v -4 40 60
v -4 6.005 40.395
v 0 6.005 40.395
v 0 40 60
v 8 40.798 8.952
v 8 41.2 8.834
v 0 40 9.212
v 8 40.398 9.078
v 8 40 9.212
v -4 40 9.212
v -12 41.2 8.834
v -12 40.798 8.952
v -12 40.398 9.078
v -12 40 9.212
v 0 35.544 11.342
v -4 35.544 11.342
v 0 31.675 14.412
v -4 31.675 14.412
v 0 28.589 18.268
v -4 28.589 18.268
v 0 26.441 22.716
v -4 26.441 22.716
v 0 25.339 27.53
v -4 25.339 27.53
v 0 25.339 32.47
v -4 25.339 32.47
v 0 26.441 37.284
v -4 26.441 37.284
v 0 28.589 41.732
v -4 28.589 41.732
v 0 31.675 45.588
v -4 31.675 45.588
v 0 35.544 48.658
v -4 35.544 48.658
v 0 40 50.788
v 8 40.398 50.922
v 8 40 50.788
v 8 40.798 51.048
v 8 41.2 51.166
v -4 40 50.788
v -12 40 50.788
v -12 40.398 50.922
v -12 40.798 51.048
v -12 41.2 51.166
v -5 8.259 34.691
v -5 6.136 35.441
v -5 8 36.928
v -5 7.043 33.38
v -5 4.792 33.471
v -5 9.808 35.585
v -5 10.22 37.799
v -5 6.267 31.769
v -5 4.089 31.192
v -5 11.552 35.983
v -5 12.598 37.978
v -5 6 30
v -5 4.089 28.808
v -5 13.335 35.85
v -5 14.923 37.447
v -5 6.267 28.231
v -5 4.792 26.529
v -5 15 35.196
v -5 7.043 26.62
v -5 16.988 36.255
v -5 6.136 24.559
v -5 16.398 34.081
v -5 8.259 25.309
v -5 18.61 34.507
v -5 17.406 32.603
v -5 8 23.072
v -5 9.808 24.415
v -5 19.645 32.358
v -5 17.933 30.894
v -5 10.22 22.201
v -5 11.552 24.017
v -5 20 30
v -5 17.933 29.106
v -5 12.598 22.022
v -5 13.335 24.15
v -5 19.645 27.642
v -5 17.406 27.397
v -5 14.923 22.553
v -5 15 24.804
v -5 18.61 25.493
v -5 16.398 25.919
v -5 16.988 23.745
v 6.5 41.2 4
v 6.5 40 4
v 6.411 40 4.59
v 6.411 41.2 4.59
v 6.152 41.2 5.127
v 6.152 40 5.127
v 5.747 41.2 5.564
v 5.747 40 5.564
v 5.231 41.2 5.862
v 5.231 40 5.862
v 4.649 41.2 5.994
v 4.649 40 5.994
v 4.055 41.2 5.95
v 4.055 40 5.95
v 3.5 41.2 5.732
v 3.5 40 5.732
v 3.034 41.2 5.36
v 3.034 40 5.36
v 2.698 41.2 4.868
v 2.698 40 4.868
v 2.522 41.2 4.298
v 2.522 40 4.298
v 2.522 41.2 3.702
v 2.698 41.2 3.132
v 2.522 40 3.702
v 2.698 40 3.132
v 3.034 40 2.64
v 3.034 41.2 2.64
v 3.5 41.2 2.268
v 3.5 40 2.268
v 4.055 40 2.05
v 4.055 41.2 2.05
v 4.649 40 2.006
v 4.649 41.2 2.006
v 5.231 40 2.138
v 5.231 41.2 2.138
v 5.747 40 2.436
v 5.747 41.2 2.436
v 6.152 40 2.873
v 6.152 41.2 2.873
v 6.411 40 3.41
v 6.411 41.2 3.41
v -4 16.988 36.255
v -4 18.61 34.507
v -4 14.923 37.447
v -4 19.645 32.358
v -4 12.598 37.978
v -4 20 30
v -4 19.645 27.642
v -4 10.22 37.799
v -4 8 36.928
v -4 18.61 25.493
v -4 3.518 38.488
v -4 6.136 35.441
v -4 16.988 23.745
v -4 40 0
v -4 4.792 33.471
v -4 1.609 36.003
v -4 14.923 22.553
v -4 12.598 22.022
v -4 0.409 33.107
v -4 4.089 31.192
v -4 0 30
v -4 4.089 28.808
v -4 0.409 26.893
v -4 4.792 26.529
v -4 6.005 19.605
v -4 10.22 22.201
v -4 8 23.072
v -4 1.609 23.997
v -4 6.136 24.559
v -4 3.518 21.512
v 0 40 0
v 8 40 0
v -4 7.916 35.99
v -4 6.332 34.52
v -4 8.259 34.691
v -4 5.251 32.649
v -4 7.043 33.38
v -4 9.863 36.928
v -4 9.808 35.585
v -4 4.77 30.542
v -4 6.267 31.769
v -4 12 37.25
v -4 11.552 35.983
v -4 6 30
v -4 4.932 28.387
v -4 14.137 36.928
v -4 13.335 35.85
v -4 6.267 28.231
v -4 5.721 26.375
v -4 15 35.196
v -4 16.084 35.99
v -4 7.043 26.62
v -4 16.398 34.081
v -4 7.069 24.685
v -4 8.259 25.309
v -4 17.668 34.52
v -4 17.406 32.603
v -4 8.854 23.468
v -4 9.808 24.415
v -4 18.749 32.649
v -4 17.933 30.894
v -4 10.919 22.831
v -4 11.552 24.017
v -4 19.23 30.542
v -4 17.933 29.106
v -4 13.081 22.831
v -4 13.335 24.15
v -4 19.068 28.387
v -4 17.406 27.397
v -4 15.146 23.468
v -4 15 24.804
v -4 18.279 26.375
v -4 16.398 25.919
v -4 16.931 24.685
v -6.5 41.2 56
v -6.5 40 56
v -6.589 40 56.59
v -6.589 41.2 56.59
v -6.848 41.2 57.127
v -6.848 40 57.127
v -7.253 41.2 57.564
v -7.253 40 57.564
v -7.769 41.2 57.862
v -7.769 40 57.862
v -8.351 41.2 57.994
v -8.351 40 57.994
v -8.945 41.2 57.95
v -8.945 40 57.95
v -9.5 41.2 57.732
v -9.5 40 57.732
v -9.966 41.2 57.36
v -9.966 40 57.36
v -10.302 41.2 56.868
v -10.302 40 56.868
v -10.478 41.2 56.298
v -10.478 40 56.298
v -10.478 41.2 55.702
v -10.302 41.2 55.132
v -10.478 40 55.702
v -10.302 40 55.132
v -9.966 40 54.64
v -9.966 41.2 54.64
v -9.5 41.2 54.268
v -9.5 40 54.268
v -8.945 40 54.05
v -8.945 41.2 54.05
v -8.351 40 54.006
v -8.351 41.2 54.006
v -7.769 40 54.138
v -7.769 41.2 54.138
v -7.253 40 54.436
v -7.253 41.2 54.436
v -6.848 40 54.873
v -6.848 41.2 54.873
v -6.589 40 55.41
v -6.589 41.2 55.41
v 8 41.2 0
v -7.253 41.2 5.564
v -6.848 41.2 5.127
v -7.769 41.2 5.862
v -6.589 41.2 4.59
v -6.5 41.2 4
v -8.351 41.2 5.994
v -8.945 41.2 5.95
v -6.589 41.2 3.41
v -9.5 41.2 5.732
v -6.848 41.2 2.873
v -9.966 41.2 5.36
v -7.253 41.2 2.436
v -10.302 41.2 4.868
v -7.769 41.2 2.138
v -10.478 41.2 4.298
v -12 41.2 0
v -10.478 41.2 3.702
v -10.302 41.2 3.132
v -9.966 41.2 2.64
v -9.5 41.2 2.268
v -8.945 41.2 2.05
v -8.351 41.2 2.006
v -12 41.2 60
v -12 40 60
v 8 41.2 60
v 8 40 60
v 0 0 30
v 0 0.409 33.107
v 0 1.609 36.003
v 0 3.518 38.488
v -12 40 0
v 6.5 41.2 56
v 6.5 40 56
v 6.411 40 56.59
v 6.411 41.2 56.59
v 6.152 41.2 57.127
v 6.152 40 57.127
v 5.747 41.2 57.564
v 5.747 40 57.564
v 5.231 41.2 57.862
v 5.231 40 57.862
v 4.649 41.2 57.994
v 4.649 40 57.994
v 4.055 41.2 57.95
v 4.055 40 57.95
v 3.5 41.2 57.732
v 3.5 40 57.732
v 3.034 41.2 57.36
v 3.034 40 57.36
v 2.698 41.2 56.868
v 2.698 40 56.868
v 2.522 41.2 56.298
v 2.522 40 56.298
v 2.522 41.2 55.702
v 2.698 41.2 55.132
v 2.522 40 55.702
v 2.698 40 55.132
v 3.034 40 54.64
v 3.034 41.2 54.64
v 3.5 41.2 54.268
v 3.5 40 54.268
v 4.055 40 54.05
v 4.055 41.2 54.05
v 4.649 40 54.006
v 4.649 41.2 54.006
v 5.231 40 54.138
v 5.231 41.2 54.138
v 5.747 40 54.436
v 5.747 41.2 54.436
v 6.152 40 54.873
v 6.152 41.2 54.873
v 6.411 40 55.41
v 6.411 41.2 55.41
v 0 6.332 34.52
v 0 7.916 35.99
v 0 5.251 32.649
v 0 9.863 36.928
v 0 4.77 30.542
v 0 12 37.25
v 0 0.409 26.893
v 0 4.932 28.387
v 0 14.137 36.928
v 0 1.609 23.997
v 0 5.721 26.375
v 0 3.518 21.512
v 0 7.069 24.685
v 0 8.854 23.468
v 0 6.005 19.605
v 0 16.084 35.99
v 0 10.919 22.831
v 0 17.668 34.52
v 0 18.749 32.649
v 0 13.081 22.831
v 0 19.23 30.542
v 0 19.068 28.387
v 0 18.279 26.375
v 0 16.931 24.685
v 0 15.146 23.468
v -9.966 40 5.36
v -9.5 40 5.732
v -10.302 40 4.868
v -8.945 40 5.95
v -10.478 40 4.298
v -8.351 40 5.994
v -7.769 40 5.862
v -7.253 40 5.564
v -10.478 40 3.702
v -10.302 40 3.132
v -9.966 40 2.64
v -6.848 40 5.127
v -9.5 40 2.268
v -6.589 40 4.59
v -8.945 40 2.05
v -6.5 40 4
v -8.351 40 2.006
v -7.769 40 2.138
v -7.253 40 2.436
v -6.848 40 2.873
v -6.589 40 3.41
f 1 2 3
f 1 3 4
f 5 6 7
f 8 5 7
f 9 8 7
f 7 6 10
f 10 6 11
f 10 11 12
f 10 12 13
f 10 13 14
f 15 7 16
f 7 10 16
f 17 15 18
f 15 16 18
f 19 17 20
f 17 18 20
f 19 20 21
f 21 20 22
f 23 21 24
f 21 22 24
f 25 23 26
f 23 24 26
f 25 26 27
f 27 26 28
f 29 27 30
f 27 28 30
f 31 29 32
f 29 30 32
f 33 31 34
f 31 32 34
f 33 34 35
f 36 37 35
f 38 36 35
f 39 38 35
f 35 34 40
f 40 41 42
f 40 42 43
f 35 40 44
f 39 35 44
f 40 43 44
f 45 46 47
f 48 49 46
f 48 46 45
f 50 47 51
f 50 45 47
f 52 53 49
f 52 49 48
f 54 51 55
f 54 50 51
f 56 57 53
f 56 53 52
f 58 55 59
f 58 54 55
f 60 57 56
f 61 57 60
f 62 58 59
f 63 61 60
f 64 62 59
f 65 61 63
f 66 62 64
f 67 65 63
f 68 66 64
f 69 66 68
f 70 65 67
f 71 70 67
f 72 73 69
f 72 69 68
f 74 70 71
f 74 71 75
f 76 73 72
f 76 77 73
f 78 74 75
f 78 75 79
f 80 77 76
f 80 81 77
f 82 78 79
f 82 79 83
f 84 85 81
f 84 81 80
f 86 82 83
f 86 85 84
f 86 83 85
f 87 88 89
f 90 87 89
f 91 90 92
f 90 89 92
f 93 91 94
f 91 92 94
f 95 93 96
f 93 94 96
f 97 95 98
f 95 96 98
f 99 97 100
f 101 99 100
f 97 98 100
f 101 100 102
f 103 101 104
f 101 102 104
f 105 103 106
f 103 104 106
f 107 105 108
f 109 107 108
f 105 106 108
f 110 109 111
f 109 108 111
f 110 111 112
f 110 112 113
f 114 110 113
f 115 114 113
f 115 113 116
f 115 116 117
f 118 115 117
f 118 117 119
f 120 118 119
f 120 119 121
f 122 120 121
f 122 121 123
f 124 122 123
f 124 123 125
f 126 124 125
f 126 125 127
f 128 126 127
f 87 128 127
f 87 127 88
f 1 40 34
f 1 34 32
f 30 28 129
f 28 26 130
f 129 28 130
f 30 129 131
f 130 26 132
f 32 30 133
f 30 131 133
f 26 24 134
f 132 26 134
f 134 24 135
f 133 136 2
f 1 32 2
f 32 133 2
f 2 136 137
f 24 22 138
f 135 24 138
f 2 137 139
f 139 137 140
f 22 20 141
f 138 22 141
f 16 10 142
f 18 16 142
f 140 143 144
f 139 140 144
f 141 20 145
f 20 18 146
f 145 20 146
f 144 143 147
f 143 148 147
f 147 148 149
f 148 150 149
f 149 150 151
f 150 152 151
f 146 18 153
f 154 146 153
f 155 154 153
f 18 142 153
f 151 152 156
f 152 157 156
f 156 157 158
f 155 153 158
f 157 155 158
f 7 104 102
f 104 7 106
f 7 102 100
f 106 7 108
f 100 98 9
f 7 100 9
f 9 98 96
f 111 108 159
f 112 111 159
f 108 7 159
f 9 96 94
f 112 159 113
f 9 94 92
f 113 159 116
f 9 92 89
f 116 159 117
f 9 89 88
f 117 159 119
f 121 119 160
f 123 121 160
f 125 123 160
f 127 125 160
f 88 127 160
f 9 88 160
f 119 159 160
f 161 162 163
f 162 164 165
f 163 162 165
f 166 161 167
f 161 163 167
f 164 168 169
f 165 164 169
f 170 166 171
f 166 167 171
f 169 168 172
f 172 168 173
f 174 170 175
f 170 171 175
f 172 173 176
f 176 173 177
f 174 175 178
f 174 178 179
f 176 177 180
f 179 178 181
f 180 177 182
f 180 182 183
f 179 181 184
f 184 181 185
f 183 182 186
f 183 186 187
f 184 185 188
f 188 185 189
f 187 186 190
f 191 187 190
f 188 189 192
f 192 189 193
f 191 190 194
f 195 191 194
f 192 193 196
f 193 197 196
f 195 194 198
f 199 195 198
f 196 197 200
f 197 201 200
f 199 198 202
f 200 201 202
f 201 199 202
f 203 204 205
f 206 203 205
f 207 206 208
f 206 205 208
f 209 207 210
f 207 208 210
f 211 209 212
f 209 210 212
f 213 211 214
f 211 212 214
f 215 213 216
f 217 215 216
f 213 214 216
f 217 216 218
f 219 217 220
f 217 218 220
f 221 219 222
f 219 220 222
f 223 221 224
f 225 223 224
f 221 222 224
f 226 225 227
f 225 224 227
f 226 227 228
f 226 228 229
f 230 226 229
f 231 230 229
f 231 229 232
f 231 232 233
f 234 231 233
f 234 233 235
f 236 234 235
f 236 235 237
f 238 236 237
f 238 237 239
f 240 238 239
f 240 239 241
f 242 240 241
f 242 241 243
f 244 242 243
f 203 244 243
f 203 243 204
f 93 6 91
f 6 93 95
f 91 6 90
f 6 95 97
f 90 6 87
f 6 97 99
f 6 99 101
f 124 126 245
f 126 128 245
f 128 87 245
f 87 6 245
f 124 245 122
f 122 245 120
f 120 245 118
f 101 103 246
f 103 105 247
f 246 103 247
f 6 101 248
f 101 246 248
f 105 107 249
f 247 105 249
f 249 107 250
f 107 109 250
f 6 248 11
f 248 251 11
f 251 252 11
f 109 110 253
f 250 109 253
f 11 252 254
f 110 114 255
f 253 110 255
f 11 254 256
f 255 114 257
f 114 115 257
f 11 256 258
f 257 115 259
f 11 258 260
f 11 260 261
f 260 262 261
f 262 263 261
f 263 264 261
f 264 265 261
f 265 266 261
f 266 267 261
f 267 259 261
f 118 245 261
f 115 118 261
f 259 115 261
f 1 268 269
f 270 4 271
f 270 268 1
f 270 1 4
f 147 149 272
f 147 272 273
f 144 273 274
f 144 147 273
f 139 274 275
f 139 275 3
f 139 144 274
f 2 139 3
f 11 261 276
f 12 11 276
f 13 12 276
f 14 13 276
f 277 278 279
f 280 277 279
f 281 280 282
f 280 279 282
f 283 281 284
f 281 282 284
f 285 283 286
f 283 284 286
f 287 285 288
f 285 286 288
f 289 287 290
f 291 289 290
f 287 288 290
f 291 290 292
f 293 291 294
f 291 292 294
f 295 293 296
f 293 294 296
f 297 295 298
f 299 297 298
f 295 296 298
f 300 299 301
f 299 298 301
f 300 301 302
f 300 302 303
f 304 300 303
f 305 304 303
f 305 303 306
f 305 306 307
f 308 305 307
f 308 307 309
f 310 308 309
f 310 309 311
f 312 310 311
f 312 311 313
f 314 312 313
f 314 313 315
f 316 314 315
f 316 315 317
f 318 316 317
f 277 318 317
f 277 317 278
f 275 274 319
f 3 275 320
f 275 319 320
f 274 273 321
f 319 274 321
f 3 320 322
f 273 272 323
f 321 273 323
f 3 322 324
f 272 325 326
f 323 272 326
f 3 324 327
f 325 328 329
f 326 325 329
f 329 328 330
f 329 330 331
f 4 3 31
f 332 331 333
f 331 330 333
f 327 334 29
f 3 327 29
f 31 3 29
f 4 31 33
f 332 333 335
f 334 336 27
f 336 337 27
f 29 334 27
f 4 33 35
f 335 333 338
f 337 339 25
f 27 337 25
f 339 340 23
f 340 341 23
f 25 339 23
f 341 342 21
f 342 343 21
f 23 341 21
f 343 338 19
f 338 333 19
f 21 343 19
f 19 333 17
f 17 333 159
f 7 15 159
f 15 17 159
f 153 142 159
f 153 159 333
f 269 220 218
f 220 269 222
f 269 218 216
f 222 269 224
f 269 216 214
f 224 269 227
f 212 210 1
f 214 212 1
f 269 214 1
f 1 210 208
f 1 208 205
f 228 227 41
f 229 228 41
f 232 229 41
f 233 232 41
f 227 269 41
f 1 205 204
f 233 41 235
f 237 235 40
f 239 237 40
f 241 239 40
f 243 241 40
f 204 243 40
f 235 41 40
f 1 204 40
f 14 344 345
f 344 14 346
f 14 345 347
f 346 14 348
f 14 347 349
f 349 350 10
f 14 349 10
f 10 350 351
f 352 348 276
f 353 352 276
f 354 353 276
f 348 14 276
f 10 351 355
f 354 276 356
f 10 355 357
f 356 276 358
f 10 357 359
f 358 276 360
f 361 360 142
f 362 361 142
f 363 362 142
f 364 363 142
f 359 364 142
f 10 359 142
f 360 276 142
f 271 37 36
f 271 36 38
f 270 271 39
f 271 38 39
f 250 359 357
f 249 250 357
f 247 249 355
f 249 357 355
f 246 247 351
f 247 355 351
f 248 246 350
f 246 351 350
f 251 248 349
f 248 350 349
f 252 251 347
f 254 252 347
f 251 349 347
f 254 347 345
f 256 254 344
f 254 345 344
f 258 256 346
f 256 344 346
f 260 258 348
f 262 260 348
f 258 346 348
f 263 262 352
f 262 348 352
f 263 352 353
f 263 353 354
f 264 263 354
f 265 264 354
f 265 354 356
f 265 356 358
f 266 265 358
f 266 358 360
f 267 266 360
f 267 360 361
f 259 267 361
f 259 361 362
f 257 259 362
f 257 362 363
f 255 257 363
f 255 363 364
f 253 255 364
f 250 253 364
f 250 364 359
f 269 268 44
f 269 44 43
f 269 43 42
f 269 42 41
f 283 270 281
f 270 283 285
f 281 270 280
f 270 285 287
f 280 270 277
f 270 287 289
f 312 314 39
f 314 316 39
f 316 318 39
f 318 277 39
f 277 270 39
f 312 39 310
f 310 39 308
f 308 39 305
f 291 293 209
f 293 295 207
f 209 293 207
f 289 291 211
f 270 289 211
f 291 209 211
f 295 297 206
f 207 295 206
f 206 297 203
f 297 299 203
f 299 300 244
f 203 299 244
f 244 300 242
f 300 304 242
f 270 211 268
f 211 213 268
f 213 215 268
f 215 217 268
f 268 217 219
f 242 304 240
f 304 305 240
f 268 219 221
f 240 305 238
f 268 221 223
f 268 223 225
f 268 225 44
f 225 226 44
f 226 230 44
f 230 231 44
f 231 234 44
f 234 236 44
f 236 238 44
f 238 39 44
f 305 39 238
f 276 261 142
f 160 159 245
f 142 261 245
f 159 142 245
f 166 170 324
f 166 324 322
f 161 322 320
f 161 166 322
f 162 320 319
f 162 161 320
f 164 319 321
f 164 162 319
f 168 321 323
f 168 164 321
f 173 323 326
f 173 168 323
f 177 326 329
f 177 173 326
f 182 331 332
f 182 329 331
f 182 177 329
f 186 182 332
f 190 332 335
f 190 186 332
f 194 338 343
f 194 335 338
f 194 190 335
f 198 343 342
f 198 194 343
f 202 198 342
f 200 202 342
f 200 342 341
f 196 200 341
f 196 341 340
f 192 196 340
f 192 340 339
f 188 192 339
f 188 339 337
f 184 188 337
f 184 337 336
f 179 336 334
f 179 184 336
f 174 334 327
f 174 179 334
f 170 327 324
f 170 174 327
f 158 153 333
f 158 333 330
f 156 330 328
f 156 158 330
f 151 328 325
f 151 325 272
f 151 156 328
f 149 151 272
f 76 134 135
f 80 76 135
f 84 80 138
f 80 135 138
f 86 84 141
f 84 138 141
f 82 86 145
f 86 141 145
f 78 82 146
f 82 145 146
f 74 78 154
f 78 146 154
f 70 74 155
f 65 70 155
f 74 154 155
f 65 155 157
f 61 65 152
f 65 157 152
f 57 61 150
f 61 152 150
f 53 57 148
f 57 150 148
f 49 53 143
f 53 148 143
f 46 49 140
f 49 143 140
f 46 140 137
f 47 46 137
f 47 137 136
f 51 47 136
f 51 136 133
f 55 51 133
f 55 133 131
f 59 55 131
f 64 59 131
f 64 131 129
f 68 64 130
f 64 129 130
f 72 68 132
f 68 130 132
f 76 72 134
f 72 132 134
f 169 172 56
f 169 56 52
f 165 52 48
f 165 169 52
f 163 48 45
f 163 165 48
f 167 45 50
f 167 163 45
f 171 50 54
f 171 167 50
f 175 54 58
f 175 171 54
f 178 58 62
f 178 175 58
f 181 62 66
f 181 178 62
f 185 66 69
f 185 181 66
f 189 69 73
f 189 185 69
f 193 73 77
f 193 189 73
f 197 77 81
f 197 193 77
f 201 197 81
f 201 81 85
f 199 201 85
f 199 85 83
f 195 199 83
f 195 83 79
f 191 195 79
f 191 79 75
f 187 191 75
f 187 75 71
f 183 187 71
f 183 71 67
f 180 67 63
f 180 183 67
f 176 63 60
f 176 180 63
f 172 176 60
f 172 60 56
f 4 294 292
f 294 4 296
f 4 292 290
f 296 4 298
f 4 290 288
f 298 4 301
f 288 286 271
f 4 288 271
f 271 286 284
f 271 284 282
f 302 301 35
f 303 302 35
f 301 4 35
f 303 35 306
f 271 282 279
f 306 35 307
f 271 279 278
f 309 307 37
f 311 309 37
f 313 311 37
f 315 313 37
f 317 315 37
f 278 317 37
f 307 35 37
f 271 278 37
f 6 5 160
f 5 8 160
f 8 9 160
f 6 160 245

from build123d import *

# Parameters (mm, degrees)
EXTRUDE_1_DEPTH          = 60
CUT_EXTRUDE_1_DEPTH      = 40
CUT_EXTRUDE_1_DEPTH_BACK = 40
SKETCH_2_R               = 7.25
SKETCH_3_R               = 8
SKETCH_3_R_2             = 6
EXTRUDE_2_DEPTH          = 1
CUT_EXTRUDE_2_REACH      = 75.103
SKETCH_4_R               = 2


with BuildPart() as part:
    # 草图1 → 凸台-拉伸1 (new body)
    with BuildSketch(Plane.XY):
        Polygon((0, 0), (0, 40), (8, 40), (8, 41.2), (-12, 41.2), (-12, 40), (-4, 40), (-4, 0), align=None)
    extrude(amount=EXTRUDE_1_DEPTH)

    # 草图2 → 切除-拉伸1 (cut, two sides: drawn at the far end of the back side and taken through both)
    with BuildSketch(Plane(origin=(0, 0, 0), x_dir=(0, 0, -1), z_dir=(1, 0, 0)).offset(-CUT_EXTRUDE_1_DEPTH_BACK)):
        with BuildLine():
            ThreePointArc((-19.604755263, 6.005094925), (-23.997453078, 1.609166037), (-30, 0))
            Line((-30, 0), (0, 0))
            Line((0, 0), (0, 40))
            Line((0, 40), (-19.604755263, 6.005094925))
        make_face()
        with BuildLine():
            Line((-40.395244737, 6.005094925), (-60, 40))
            Line((-60, 40), (-60, 0))
            Line((-60, 0), (-30, 0))
            ThreePointArc((-30, 0), (-36.002546922, 1.609166037), (-40.395244737, 6.005094925))
        make_face()
        with Locations(Location((-30, 12, 0), (0, 0, 180))):
            Circle(SKETCH_2_R)
        with BuildLine():
            Line((-51.166010489, 41.2), (-8.833989511, 41.2))
            ThreePointArc((-8.833989511, 41.2), (-30, 25.2), (-51.166010489, 41.2))
        make_face()
    extrude(amount=CUT_EXTRUDE_1_DEPTH + CUT_EXTRUDE_1_DEPTH_BACK, mode=Mode.SUBTRACT)

    # 草图3 → 凸台-拉伸2 (add)
    with BuildSketch(Plane.ZY.offset(4)):
        with Locations(Location((30, 12, 0), (0, 0, 90))):
            Circle(SKETCH_3_R)
        with Locations(Location((30, 12, 0), (0, 0, 270))):
            Circle(SKETCH_3_R_2, mode=Mode.SUBTRACT)
    extrude(amount=EXTRUDE_2_DEPTH)

    # 草图4 → 切除-拉伸2 (cut, up to next)
    with BuildSketch(Plane.XZ.offset(-40), mode=Mode.PRIVATE) as cut_extrude_2_sk1:
        with Locations((-8.5, 4)):
            Circle(SKETCH_4_R)
    cut_extrude_2_tool1 = extrude(cut_extrude_2_sk1.sketch, amount=-CUT_EXTRUDE_2_REACH, mode=Mode.PRIVATE) & part.part
    # 草图4 → 切除-拉伸2 (cut, up to next)
    with BuildSketch(Plane.XZ.offset(-40), mode=Mode.PRIVATE) as cut_extrude_2_sk2:
        with Locations((4.5, 4)):
            Circle(SKETCH_4_R)
    cut_extrude_2_tool2 = extrude(cut_extrude_2_sk2.sketch, amount=-CUT_EXTRUDE_2_REACH, mode=Mode.PRIVATE) & part.part
    # 草图4 → 切除-拉伸2 (cut, up to next)
    with BuildSketch(Plane.XZ.offset(-40), mode=Mode.PRIVATE) as cut_extrude_2_sk3:
        with Locations((-8.5, 56)):
            Circle(SKETCH_4_R)
    cut_extrude_2_tool3 = extrude(cut_extrude_2_sk3.sketch, amount=-CUT_EXTRUDE_2_REACH, mode=Mode.PRIVATE) & part.part
    # 草图4 → 切除-拉伸2 (cut, up to next)
    with BuildSketch(Plane.XZ.offset(-40), mode=Mode.PRIVATE) as cut_extrude_2_sk4:
        with Locations((4.5, 56)):
            Circle(SKETCH_4_R)
    cut_extrude_2_tool4 = extrude(cut_extrude_2_sk4.sketch, amount=-CUT_EXTRUDE_2_REACH, mode=Mode.PRIVATE) & part.part
    add(cut_extrude_2_tool1.solids().sort_by_distance((-8.5, 40, 4))[0], mode=Mode.SUBTRACT)
    add(cut_extrude_2_tool2.solids().sort_by_distance((4.5, 40, 4))[0], mode=Mode.SUBTRACT)
    add(cut_extrude_2_tool3.solids().sort_by_distance((-8.5, 40, 56))[0], mode=Mode.SUBTRACT)
    add(cut_extrude_2_tool4.solids().sort_by_distance((4.5, 40, 56))[0], mode=Mode.SUBTRACT)


solid = part.part
